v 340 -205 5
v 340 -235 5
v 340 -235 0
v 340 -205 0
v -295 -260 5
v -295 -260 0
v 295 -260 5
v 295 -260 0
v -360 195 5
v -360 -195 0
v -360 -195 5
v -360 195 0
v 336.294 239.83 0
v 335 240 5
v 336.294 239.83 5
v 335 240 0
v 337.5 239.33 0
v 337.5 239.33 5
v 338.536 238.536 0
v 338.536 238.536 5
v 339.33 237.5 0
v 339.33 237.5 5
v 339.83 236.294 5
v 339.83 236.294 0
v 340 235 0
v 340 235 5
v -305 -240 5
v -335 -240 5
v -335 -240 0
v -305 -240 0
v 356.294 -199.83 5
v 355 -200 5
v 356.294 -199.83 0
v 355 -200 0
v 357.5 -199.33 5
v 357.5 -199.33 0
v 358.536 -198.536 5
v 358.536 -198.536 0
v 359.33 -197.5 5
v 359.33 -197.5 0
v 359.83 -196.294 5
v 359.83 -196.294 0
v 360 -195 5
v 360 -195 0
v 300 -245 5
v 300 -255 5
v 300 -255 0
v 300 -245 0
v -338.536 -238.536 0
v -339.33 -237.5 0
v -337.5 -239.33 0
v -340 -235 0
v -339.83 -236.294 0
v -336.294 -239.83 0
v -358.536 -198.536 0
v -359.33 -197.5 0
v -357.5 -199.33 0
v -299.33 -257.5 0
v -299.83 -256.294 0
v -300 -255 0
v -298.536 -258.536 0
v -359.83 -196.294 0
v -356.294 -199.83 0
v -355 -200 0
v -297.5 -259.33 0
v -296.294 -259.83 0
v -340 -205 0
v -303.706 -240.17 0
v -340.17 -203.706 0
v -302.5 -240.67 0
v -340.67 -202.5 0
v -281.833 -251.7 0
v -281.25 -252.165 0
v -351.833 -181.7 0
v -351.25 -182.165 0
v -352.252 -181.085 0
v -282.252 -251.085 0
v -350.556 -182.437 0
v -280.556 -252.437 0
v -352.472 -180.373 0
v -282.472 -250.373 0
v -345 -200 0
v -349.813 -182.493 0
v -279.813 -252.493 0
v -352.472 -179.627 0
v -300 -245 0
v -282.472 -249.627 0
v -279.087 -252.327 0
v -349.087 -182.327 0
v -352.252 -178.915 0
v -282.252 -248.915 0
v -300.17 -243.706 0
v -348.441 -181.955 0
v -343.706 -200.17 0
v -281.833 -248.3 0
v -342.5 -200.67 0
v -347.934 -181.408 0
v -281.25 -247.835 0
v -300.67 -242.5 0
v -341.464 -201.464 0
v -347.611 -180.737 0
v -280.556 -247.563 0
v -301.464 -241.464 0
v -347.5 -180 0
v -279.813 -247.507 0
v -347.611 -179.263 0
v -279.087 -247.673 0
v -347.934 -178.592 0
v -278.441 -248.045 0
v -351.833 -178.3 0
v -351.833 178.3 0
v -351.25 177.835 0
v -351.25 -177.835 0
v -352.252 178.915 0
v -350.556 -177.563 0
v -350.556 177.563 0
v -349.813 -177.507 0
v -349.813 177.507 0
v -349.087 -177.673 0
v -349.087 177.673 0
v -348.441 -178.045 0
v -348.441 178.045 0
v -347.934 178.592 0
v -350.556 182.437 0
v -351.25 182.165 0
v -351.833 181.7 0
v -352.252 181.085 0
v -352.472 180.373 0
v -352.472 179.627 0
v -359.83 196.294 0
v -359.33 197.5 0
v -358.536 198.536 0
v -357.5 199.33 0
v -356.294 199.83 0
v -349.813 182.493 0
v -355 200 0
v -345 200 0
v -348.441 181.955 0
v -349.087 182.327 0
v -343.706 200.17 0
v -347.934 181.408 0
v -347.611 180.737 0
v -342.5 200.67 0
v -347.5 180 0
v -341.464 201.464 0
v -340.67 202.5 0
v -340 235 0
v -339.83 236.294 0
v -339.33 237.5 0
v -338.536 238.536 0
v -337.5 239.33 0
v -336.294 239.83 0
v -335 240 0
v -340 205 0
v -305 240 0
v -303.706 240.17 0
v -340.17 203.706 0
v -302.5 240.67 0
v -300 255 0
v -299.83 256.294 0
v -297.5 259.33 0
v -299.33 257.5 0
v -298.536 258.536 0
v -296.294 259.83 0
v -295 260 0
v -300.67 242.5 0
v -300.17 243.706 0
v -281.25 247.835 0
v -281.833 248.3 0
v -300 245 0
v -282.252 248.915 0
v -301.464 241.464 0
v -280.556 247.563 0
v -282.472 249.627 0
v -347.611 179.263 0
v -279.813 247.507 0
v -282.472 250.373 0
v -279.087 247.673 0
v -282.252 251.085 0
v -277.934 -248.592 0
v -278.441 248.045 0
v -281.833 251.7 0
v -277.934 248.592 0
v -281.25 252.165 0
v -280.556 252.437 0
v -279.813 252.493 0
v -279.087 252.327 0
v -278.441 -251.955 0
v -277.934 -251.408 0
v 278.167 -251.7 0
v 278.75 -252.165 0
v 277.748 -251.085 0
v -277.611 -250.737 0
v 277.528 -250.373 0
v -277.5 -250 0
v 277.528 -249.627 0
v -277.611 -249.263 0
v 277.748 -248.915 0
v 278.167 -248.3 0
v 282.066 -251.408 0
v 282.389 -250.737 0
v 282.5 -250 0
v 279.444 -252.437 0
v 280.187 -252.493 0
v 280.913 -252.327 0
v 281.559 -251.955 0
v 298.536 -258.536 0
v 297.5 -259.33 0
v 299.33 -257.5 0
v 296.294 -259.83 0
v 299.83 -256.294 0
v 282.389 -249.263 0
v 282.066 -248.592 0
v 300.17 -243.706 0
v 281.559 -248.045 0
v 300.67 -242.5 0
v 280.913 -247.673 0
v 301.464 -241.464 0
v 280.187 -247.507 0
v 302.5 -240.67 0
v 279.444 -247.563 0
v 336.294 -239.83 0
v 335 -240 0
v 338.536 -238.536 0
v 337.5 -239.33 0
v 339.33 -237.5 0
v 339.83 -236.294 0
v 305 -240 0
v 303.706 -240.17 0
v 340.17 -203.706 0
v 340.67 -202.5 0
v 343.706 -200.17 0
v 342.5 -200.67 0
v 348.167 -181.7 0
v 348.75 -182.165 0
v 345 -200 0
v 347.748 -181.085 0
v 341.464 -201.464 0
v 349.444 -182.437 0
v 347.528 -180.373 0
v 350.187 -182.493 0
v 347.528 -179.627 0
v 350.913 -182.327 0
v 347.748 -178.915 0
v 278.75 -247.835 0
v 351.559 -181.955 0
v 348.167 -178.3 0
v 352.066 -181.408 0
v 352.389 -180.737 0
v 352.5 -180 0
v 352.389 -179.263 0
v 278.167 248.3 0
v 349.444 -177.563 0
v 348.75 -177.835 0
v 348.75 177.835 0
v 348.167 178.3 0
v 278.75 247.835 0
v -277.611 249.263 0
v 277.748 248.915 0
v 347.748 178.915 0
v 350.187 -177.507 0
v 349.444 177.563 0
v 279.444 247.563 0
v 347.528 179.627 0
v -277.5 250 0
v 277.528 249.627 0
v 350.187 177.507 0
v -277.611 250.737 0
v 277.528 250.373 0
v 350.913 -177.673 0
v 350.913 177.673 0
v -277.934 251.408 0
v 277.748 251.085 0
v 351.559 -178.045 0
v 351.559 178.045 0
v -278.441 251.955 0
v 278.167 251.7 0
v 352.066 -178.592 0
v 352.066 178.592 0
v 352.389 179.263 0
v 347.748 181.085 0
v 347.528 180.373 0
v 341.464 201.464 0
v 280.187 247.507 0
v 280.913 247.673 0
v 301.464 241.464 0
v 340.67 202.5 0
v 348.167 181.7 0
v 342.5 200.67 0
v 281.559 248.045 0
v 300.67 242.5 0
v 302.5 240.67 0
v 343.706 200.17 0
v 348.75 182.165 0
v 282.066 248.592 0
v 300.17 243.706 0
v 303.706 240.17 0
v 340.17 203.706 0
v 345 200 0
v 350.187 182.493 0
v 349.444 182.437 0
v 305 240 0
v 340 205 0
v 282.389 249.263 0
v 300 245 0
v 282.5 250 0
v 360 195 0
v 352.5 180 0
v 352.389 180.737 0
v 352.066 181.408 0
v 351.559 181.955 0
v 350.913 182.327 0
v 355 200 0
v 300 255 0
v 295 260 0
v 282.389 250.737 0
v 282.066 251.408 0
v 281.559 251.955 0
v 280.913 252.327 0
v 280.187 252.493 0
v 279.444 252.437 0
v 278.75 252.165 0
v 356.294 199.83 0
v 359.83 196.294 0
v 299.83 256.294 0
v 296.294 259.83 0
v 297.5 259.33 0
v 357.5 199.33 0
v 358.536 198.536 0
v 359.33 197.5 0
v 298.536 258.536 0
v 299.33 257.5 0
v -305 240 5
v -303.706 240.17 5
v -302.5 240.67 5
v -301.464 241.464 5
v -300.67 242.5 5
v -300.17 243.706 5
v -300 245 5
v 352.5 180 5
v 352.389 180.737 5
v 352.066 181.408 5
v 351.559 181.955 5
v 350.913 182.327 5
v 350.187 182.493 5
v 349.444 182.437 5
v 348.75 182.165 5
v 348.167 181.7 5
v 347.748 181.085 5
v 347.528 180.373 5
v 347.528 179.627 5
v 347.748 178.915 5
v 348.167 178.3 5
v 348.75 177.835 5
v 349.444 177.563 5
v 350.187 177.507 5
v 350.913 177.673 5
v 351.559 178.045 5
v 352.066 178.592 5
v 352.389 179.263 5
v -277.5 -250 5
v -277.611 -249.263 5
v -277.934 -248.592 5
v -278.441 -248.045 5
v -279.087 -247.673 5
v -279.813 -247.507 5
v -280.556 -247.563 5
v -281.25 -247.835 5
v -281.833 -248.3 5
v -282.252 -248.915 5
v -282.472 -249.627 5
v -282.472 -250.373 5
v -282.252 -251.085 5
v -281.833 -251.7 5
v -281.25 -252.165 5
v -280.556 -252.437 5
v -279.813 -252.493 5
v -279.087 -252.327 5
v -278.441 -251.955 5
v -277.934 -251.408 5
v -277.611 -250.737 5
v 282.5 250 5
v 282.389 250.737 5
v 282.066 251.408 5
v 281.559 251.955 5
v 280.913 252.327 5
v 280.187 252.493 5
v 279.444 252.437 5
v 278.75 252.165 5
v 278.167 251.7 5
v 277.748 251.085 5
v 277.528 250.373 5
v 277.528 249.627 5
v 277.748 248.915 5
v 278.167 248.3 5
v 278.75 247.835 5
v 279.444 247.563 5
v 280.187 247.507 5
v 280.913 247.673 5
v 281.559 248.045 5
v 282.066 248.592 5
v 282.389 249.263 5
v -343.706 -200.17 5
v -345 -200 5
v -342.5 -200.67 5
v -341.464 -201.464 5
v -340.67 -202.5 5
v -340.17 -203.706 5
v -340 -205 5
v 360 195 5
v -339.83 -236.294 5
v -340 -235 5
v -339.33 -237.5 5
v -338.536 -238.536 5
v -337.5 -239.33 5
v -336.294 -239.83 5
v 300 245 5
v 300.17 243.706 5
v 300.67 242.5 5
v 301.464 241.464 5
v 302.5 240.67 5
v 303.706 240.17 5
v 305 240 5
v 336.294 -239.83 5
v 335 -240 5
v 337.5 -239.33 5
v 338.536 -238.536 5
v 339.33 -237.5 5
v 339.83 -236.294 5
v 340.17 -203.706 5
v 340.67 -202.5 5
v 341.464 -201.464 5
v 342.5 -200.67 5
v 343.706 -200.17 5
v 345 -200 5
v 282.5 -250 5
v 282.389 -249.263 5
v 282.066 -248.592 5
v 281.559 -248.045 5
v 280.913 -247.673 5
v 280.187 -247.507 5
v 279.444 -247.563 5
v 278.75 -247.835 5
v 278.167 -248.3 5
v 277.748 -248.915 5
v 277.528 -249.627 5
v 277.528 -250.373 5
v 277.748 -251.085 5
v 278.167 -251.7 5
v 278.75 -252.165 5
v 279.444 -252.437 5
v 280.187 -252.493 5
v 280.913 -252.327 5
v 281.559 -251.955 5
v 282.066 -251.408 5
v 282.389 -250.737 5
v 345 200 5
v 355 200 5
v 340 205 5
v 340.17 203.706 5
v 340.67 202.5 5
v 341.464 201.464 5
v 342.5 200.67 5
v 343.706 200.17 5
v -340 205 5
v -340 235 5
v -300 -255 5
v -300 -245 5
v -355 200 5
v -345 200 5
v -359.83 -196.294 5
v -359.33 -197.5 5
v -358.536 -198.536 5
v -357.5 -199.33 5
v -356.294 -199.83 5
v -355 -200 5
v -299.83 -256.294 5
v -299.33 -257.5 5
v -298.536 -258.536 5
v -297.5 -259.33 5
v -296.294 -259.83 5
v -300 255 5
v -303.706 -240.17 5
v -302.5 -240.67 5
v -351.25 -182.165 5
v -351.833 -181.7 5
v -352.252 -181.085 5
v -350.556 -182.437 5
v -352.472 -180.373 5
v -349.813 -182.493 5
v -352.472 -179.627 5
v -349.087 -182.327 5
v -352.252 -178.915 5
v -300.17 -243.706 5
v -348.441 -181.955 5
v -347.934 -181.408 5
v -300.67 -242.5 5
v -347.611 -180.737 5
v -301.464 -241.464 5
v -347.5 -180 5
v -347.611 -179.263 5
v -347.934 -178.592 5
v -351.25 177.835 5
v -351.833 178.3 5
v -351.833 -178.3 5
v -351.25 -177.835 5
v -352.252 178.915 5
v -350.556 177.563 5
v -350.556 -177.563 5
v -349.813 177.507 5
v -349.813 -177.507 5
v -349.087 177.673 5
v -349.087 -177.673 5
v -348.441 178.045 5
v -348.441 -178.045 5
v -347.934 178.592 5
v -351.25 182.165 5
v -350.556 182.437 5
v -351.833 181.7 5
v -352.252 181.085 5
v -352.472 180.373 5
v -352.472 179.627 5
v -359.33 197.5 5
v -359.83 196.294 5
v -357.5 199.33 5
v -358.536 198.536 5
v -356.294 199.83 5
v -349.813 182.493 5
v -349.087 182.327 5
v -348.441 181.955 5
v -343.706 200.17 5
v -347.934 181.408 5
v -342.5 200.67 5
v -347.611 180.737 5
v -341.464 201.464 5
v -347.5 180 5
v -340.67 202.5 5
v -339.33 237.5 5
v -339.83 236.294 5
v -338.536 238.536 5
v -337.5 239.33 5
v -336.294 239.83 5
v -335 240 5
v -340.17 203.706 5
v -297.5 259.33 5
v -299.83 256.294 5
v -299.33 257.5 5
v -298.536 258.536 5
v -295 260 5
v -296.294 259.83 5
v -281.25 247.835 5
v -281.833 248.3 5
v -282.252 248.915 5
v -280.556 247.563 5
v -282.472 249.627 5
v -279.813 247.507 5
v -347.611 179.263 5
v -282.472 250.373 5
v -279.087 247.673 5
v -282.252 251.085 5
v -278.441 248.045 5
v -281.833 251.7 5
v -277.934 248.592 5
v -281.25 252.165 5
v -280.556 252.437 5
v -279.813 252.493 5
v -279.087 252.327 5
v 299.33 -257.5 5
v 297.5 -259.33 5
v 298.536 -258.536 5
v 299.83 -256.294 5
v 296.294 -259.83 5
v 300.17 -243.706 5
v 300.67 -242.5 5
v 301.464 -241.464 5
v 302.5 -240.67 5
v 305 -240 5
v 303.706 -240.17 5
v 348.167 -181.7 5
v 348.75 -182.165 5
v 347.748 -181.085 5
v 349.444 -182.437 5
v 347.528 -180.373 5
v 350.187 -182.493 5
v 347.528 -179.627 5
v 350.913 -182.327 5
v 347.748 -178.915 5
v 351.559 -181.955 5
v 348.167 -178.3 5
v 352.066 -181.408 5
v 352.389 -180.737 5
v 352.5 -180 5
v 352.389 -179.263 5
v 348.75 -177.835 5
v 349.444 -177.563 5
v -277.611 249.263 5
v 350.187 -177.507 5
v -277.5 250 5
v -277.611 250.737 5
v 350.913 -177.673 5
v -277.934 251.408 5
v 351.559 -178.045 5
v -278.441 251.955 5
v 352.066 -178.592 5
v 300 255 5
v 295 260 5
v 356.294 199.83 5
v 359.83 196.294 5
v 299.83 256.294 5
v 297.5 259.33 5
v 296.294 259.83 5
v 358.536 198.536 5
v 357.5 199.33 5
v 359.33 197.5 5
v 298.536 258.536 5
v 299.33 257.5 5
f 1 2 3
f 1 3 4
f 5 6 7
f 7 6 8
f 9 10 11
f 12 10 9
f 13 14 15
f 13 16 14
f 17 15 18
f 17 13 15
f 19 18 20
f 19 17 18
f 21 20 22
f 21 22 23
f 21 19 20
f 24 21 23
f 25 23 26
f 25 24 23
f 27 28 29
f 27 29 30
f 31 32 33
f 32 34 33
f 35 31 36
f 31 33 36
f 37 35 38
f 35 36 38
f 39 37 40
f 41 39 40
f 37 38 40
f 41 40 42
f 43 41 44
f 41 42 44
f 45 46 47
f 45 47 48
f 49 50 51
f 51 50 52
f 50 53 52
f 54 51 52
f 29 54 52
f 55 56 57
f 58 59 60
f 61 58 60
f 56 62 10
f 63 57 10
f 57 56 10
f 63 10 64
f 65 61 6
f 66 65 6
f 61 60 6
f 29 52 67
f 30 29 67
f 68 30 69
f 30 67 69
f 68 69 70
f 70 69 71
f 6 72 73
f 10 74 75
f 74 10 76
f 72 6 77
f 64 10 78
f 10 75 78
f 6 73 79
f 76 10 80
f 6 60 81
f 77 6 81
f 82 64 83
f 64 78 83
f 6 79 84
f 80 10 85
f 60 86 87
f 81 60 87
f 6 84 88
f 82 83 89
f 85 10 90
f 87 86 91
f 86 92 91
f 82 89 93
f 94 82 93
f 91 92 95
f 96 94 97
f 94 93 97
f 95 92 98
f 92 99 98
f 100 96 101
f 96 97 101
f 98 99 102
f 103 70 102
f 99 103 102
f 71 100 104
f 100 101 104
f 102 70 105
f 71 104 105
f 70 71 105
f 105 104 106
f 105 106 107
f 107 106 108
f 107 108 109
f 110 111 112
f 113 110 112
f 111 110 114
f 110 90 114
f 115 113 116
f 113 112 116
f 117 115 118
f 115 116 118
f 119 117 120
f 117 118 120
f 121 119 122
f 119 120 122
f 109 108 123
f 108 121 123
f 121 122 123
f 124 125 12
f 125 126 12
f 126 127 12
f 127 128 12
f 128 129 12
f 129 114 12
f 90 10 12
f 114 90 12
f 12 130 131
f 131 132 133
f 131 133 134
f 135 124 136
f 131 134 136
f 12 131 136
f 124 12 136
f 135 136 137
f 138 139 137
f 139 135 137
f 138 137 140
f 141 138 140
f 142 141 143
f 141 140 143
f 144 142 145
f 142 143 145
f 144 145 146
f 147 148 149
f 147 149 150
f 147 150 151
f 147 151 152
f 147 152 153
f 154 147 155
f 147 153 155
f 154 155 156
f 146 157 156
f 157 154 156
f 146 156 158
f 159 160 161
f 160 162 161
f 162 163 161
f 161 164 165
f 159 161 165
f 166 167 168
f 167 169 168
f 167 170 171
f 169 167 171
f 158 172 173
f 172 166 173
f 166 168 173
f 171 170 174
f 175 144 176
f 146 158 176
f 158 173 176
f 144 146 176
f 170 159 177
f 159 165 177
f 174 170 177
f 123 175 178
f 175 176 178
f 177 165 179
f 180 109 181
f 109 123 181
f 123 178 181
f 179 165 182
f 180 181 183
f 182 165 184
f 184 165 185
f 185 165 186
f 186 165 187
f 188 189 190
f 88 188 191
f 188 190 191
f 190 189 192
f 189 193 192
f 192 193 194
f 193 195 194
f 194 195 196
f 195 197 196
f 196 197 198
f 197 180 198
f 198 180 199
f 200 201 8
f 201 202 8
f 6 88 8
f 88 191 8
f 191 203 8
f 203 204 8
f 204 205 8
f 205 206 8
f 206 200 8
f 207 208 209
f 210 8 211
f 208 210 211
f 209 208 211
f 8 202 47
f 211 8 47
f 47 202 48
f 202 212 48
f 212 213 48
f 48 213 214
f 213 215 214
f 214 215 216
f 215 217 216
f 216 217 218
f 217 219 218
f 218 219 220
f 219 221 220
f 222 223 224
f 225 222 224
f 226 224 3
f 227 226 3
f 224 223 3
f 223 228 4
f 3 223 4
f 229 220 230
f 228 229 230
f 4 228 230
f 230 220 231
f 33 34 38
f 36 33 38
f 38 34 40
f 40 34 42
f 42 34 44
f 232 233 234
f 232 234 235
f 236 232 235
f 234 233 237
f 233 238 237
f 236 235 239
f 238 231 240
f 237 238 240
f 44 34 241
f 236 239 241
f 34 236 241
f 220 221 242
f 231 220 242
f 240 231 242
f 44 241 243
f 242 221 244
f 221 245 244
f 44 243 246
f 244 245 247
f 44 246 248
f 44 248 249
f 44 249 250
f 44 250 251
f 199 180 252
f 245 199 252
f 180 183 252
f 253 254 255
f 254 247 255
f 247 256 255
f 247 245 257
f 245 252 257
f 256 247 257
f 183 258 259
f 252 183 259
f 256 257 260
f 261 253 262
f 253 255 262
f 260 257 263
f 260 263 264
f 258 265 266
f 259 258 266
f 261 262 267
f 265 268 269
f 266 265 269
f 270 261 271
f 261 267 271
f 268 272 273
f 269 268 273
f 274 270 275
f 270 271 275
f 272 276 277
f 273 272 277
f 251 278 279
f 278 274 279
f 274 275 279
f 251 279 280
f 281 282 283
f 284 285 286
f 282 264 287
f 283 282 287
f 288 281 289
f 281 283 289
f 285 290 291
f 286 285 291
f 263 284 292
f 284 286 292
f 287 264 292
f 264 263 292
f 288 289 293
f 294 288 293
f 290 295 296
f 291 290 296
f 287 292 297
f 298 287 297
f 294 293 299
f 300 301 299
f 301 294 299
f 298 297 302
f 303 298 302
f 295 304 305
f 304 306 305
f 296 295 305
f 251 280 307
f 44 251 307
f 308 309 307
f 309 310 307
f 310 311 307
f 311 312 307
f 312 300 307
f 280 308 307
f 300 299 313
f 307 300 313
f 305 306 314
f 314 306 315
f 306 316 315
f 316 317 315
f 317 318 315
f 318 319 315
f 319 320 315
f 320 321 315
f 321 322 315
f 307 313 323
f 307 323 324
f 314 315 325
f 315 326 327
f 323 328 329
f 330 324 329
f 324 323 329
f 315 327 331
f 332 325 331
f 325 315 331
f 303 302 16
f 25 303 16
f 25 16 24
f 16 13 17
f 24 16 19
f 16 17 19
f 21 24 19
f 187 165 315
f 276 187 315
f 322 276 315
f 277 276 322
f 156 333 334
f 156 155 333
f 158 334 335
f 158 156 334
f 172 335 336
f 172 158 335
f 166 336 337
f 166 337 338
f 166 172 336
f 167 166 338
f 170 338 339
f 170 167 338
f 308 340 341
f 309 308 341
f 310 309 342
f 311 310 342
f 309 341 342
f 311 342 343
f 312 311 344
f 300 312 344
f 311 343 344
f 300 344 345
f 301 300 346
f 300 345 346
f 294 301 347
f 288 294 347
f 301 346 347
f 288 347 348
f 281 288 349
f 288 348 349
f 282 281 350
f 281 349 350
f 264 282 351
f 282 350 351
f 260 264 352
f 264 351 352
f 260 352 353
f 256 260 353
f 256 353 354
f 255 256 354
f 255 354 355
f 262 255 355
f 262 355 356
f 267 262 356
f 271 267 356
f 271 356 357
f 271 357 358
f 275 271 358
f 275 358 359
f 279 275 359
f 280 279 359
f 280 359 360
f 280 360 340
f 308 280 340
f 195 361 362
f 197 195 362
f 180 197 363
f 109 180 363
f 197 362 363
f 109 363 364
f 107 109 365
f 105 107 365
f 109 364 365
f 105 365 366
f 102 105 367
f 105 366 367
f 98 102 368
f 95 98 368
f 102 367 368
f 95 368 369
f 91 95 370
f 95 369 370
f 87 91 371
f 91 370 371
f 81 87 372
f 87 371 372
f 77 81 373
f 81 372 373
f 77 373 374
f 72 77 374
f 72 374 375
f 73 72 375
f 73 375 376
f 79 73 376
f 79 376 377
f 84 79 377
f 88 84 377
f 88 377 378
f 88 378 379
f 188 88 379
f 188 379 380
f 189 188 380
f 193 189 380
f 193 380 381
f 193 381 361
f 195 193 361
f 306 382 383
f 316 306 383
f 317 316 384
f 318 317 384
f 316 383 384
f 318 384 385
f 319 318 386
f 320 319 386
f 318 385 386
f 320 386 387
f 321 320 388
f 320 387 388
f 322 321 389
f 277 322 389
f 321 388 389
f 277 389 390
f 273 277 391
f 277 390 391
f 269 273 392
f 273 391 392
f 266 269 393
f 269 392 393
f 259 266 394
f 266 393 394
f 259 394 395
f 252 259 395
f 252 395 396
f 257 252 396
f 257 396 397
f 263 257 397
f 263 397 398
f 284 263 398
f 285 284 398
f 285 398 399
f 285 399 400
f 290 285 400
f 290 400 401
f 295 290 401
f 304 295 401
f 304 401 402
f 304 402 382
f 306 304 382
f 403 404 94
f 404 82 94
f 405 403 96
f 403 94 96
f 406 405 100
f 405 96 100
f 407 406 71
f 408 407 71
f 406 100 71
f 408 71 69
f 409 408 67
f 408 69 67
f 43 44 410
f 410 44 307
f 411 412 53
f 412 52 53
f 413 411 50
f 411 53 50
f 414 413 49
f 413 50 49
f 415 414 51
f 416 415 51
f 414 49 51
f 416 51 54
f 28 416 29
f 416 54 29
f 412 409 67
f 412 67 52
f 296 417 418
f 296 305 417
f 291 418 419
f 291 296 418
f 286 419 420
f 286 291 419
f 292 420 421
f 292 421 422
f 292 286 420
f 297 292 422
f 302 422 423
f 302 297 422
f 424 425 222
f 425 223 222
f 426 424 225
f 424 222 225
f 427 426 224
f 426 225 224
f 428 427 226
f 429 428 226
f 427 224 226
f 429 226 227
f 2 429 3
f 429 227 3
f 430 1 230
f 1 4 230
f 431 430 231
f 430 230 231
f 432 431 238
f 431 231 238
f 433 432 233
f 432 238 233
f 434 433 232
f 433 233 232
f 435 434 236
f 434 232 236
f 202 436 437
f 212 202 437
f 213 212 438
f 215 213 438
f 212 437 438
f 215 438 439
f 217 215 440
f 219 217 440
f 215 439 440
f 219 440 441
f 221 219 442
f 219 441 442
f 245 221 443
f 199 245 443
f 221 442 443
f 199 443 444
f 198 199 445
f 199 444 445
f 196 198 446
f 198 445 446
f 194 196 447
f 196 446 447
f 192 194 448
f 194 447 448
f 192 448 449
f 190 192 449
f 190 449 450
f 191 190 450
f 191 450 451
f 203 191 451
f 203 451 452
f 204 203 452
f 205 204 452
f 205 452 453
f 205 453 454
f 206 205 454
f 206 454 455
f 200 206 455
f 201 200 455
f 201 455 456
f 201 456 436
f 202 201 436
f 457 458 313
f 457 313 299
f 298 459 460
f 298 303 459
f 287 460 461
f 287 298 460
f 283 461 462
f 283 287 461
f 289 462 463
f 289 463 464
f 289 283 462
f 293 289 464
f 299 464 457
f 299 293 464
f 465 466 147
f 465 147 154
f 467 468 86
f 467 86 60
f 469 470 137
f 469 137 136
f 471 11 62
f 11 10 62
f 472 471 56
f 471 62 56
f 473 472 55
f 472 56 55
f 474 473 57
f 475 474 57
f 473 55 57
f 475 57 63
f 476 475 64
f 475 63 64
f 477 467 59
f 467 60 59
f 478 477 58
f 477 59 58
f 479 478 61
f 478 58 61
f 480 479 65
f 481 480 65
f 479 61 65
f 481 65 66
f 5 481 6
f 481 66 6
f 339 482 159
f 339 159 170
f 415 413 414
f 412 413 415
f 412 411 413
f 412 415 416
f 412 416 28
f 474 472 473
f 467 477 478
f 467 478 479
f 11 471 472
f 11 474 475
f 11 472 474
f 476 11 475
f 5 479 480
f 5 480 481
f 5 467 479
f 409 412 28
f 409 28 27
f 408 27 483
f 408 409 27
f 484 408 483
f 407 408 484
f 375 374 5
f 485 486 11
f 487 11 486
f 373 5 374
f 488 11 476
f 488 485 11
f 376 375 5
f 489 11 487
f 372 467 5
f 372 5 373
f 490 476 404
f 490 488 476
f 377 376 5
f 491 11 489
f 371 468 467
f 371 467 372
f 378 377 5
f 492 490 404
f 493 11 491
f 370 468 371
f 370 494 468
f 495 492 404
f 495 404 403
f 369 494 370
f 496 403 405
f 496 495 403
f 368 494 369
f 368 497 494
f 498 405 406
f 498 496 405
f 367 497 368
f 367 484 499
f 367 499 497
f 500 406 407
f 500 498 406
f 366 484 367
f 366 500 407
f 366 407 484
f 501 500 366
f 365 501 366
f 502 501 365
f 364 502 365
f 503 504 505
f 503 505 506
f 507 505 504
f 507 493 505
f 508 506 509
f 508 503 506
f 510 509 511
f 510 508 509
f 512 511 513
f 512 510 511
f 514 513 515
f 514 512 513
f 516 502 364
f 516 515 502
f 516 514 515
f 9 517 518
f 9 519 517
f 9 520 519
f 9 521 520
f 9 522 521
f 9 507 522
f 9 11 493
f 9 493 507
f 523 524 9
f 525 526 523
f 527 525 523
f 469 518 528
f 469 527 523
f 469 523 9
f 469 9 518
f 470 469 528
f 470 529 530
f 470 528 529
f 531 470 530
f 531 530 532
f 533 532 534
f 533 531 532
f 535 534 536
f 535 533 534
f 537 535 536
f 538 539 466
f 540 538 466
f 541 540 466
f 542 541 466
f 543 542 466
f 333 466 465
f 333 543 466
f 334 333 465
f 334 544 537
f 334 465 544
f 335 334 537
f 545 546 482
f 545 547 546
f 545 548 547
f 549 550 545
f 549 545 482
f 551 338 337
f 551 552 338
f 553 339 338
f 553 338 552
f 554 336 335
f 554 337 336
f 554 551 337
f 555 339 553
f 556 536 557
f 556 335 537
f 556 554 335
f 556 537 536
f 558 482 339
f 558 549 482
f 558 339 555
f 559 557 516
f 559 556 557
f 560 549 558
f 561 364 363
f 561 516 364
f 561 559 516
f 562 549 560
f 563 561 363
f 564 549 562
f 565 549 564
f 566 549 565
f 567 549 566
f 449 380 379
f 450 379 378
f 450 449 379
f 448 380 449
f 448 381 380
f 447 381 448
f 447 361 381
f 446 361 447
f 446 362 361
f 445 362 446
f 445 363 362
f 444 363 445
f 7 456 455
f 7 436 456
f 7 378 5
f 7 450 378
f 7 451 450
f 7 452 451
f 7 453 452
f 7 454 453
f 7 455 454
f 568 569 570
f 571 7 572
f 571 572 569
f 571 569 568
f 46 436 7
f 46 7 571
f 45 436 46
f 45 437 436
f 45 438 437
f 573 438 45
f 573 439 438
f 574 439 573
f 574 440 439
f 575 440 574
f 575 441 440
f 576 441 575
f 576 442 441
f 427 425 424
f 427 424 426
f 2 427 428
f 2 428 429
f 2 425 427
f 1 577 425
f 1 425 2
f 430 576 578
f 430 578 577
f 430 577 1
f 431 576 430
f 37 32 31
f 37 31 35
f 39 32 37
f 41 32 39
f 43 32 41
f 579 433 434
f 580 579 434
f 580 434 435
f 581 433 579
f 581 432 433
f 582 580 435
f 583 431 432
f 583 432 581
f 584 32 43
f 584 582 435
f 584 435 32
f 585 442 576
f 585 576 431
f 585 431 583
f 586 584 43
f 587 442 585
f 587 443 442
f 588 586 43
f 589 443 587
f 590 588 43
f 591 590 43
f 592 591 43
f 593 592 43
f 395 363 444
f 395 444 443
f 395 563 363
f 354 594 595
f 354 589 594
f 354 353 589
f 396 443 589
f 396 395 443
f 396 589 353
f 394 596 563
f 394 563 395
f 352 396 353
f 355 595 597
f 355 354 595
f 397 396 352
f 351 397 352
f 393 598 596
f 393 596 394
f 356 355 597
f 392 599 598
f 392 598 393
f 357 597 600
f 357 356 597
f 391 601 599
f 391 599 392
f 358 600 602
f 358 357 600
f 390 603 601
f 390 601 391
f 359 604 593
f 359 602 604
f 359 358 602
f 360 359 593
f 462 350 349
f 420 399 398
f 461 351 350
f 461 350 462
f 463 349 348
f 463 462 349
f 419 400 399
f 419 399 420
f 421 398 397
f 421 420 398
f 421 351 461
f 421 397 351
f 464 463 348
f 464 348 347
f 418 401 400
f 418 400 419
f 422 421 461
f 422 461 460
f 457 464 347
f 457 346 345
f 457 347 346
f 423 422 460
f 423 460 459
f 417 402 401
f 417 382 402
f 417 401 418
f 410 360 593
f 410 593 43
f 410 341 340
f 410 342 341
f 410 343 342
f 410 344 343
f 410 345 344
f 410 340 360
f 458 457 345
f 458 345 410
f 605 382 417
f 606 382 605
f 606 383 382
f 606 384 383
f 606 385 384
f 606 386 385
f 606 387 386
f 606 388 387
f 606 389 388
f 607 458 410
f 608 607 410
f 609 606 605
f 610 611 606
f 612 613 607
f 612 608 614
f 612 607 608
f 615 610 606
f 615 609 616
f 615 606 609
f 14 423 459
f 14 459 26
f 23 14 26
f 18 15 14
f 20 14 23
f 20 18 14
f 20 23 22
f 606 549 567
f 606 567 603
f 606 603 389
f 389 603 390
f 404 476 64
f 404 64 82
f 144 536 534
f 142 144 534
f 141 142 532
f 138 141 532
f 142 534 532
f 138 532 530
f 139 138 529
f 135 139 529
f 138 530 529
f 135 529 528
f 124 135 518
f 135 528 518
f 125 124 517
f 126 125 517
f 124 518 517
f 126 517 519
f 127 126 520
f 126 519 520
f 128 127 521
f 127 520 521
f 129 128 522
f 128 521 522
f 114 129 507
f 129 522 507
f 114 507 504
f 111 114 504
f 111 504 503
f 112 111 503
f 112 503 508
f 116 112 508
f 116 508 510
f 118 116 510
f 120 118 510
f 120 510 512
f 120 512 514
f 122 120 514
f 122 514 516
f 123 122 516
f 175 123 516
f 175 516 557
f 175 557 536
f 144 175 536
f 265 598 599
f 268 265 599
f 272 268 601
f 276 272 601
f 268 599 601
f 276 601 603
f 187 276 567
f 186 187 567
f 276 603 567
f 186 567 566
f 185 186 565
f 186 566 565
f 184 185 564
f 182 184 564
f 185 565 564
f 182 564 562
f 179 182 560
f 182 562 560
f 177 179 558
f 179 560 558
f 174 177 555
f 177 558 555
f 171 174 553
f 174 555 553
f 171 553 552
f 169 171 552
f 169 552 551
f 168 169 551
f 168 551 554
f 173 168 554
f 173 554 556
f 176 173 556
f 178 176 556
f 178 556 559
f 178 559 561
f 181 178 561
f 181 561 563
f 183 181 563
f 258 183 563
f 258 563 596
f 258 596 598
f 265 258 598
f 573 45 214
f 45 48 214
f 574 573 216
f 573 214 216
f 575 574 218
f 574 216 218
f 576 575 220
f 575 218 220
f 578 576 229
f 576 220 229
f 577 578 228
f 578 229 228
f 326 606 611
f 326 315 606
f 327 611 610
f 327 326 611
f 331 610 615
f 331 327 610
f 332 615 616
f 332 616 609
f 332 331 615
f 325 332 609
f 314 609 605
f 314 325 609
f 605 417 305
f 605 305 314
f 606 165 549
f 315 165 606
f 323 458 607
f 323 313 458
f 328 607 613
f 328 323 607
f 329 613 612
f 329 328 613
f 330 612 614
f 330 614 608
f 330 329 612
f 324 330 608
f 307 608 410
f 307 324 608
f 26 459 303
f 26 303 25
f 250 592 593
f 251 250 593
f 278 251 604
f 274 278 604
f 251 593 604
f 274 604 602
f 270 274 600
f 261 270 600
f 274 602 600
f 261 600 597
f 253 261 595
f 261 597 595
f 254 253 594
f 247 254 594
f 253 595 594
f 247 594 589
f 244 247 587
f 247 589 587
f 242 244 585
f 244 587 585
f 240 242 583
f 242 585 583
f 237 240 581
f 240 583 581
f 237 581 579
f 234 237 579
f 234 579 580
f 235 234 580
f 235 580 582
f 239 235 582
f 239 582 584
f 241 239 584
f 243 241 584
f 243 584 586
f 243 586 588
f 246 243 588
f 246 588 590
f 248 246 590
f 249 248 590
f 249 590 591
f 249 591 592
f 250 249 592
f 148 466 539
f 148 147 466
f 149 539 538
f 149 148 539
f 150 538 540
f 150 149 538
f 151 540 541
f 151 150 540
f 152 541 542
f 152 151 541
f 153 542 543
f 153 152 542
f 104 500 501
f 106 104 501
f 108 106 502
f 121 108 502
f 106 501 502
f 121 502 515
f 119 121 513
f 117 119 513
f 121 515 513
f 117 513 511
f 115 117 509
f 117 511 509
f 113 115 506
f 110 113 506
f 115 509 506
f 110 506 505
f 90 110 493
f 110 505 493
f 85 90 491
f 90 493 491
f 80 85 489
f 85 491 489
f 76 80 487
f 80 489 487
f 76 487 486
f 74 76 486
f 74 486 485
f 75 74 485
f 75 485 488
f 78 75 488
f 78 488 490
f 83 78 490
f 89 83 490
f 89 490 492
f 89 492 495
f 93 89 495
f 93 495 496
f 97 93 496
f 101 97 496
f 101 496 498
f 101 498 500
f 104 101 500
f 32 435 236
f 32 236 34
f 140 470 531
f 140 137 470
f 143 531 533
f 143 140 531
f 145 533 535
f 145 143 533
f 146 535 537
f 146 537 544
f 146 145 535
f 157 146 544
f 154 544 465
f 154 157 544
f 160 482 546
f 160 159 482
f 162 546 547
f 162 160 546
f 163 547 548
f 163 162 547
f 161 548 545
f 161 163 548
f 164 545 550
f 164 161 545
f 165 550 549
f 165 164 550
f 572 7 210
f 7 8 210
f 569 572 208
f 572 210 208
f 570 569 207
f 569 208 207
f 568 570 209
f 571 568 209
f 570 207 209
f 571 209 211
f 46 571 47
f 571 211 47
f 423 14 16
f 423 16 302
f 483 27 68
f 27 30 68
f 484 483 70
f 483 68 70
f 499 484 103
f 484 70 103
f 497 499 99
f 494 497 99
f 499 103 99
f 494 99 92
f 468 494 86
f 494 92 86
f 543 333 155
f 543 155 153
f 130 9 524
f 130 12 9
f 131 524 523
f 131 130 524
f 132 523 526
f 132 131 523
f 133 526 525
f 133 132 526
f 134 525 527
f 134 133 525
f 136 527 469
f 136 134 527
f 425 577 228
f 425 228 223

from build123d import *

# Parameters (mm, degrees)
SKETCH_1_W          = 720
SKETCH_1_H          = 520
EXTRUDE_1_DEPTH     = 5
CUT_EXTRUDE_1_DEPTH = 445.100213916
SKETCH_3_R          = 2.5
CUT_EXTRUDE_2_DEPTH = 445.100213916
FILLET_1_R          = 5


with BuildPart() as part:
    # 草图1 → 凸台-拉伸1 (new body)
    with BuildSketch(Plane.XY):
        Rectangle(SKETCH_1_W, SKETCH_1_H)
    extrude(amount=EXTRUDE_1_DEPTH)

    # 草图2 → 切除-拉伸1 (cut, through all)
    with BuildSketch(Plane.XY.offset(5)):
        Polygon((340, -240), (340, -200), (360, -200), (360, -260), (300, -260), (300, -240), align=None)
        Polygon((340, 240), (300, 240), (300, 260), (360, 260), (360, 200), (340, 200), align=None)
        Polygon((-340, 240), (-340, 200), (-360, 200), (-360, 260), (-300, 260), (-300, 240), align=None)
        Polygon((-340, -240), (-300, -240), (-300, -260), (-360, -260), (-360, -200), (-340, -200), align=None)
    extrude(amount=-CUT_EXTRUDE_1_DEPTH, mode=Mode.SUBTRACT)

    # 草图3 → 切除-拉伸2 (cut, through all)
    with BuildSketch(Plane.XY.offset(5)):
        with Locations((350, 180)):
            Circle(SKETCH_3_R)
        with Locations((280, 250)):
            Circle(SKETCH_3_R)
        with Locations((-280, 250)):
            Circle(SKETCH_3_R)
        with Locations((-350, 180)):
            Circle(SKETCH_3_R)
        with Locations((-350, -180)):
            Circle(SKETCH_3_R)
        with Locations((-280, -250)):
            Circle(SKETCH_3_R)
        with Locations((350, -180)):
            Circle(SKETCH_3_R)
        with Locations((280, -250)):
            Circle(SKETCH_3_R)
    extrude(amount=-CUT_EXTRUDE_2_DEPTH, mode=Mode.SUBTRACT)

    # 圆角1
    fillet_1_edges = [part.edges().sort_by_distance(p)[0] for p in [
        (-360, -200, 2.5),
        (-340, -200, 2.5),
        (-340, -240, 2.5),
        (-300, -240, 2.5),
        (-300, -260, 2.5),
        (-300, 260, 2.5),
        (-300, 240, 2.5),
        (-340, 240, 2.5),
        (-340, 200, 2.5),
        (-360, 200, 2.5),
        (360, 200, 2.5),
        (340, 200, 2.5),
        (340, 240, 2.5),
        (300, 240, 2.5),
        (300, 260, 2.5),
        (300, -260, 2.5),
        (300, -240, 2.5),
        (340, -240, 2.5),
        (340, -200, 2.5),
        (360, -200, 2.5),
    ]]
    fillet(fillet_1_edges, radius=FILLET_1_R)


solid = part.part
